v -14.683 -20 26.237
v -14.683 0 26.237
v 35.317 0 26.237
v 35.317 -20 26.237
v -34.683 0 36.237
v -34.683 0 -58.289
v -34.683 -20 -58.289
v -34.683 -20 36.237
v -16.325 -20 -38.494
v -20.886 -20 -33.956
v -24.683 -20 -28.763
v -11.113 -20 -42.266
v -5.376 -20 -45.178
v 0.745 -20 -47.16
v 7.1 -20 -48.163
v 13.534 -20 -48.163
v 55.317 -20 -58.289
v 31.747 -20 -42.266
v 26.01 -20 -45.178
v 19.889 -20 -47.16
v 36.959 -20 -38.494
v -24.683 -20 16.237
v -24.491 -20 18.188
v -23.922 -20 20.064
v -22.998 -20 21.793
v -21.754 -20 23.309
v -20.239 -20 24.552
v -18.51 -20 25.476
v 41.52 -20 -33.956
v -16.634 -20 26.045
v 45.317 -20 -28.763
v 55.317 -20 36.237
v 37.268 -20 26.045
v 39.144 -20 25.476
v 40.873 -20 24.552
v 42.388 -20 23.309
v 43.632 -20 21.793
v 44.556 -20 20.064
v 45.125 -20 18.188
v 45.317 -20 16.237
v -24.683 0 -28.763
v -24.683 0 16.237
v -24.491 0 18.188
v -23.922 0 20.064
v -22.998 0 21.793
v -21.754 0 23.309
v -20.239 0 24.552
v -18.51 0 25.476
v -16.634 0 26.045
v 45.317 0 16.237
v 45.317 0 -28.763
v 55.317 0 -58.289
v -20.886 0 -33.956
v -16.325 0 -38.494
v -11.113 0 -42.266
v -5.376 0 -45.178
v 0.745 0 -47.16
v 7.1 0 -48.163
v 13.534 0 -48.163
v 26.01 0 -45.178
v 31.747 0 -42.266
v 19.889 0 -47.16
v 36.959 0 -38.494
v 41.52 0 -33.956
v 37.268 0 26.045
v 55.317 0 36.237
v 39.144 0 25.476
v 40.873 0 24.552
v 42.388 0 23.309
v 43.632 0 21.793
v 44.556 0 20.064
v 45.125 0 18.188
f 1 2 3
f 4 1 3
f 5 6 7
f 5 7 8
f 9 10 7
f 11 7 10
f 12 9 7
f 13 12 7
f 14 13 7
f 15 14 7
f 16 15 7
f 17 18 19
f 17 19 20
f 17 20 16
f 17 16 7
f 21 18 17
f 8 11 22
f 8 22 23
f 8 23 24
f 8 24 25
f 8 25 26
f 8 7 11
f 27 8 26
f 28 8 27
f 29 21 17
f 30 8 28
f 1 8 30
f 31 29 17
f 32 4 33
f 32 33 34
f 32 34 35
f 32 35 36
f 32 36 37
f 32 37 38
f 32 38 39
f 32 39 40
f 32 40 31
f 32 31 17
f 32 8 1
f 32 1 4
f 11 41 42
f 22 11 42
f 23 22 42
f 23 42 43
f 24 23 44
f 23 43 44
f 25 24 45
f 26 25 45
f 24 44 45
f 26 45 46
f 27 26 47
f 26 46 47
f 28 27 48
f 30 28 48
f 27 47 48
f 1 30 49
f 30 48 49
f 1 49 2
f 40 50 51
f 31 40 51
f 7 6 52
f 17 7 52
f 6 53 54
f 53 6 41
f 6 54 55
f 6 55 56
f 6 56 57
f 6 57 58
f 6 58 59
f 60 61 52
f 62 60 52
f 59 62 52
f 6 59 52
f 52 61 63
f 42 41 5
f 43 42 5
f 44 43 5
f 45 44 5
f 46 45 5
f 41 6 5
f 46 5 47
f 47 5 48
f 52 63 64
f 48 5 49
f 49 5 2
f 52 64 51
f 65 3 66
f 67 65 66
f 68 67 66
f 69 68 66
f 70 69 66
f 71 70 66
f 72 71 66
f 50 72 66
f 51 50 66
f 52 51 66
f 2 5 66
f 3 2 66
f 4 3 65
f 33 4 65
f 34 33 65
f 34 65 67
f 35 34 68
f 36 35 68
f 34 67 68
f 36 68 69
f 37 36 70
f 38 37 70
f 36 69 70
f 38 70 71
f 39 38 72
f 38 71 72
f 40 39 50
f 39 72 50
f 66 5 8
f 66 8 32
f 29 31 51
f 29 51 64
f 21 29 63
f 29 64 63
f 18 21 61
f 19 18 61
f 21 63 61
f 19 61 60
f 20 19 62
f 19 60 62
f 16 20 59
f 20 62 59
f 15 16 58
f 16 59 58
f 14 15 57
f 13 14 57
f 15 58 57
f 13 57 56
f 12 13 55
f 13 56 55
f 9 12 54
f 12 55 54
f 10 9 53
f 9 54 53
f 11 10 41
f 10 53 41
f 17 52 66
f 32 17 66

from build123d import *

# Parameters (mm, degrees)
F0_W     = 90
F0_H     = 94.526901
F1_DEPTH = 20


with BuildPart() as f1:
    # F0 (on Front) → F1 (new body)
    with BuildSketch(Plane.XZ):
        with Locations((10.317164, -11.026002)):
            Rectangle(F0_W, F0_H)
        with BuildLine():
            ThreePointArc((-24.682836, 16.237448), (-21.753904, 23.308516), (-14.682836, 26.237448))
            Line((-14.682836, 26.237448), (35.317164, 26.237448))
            ThreePointArc((35.317164, 26.237448), (42.388231, 23.308516), (45.317164, 16.237448))
            Line((45.317164, 16.237448), (45.317164, -28.762552))
            ThreePointArc((45.317164, -28.762552), (10.317164, -48.289453), (-24.682836, -28.762552))
            Line((-24.682836, -28.762552), (-24.682836, 16.237448))
        make_face(mode=Mode.SUBTRACT)
    extrude(amount=F1_DEPTH)


solid = f1.part
